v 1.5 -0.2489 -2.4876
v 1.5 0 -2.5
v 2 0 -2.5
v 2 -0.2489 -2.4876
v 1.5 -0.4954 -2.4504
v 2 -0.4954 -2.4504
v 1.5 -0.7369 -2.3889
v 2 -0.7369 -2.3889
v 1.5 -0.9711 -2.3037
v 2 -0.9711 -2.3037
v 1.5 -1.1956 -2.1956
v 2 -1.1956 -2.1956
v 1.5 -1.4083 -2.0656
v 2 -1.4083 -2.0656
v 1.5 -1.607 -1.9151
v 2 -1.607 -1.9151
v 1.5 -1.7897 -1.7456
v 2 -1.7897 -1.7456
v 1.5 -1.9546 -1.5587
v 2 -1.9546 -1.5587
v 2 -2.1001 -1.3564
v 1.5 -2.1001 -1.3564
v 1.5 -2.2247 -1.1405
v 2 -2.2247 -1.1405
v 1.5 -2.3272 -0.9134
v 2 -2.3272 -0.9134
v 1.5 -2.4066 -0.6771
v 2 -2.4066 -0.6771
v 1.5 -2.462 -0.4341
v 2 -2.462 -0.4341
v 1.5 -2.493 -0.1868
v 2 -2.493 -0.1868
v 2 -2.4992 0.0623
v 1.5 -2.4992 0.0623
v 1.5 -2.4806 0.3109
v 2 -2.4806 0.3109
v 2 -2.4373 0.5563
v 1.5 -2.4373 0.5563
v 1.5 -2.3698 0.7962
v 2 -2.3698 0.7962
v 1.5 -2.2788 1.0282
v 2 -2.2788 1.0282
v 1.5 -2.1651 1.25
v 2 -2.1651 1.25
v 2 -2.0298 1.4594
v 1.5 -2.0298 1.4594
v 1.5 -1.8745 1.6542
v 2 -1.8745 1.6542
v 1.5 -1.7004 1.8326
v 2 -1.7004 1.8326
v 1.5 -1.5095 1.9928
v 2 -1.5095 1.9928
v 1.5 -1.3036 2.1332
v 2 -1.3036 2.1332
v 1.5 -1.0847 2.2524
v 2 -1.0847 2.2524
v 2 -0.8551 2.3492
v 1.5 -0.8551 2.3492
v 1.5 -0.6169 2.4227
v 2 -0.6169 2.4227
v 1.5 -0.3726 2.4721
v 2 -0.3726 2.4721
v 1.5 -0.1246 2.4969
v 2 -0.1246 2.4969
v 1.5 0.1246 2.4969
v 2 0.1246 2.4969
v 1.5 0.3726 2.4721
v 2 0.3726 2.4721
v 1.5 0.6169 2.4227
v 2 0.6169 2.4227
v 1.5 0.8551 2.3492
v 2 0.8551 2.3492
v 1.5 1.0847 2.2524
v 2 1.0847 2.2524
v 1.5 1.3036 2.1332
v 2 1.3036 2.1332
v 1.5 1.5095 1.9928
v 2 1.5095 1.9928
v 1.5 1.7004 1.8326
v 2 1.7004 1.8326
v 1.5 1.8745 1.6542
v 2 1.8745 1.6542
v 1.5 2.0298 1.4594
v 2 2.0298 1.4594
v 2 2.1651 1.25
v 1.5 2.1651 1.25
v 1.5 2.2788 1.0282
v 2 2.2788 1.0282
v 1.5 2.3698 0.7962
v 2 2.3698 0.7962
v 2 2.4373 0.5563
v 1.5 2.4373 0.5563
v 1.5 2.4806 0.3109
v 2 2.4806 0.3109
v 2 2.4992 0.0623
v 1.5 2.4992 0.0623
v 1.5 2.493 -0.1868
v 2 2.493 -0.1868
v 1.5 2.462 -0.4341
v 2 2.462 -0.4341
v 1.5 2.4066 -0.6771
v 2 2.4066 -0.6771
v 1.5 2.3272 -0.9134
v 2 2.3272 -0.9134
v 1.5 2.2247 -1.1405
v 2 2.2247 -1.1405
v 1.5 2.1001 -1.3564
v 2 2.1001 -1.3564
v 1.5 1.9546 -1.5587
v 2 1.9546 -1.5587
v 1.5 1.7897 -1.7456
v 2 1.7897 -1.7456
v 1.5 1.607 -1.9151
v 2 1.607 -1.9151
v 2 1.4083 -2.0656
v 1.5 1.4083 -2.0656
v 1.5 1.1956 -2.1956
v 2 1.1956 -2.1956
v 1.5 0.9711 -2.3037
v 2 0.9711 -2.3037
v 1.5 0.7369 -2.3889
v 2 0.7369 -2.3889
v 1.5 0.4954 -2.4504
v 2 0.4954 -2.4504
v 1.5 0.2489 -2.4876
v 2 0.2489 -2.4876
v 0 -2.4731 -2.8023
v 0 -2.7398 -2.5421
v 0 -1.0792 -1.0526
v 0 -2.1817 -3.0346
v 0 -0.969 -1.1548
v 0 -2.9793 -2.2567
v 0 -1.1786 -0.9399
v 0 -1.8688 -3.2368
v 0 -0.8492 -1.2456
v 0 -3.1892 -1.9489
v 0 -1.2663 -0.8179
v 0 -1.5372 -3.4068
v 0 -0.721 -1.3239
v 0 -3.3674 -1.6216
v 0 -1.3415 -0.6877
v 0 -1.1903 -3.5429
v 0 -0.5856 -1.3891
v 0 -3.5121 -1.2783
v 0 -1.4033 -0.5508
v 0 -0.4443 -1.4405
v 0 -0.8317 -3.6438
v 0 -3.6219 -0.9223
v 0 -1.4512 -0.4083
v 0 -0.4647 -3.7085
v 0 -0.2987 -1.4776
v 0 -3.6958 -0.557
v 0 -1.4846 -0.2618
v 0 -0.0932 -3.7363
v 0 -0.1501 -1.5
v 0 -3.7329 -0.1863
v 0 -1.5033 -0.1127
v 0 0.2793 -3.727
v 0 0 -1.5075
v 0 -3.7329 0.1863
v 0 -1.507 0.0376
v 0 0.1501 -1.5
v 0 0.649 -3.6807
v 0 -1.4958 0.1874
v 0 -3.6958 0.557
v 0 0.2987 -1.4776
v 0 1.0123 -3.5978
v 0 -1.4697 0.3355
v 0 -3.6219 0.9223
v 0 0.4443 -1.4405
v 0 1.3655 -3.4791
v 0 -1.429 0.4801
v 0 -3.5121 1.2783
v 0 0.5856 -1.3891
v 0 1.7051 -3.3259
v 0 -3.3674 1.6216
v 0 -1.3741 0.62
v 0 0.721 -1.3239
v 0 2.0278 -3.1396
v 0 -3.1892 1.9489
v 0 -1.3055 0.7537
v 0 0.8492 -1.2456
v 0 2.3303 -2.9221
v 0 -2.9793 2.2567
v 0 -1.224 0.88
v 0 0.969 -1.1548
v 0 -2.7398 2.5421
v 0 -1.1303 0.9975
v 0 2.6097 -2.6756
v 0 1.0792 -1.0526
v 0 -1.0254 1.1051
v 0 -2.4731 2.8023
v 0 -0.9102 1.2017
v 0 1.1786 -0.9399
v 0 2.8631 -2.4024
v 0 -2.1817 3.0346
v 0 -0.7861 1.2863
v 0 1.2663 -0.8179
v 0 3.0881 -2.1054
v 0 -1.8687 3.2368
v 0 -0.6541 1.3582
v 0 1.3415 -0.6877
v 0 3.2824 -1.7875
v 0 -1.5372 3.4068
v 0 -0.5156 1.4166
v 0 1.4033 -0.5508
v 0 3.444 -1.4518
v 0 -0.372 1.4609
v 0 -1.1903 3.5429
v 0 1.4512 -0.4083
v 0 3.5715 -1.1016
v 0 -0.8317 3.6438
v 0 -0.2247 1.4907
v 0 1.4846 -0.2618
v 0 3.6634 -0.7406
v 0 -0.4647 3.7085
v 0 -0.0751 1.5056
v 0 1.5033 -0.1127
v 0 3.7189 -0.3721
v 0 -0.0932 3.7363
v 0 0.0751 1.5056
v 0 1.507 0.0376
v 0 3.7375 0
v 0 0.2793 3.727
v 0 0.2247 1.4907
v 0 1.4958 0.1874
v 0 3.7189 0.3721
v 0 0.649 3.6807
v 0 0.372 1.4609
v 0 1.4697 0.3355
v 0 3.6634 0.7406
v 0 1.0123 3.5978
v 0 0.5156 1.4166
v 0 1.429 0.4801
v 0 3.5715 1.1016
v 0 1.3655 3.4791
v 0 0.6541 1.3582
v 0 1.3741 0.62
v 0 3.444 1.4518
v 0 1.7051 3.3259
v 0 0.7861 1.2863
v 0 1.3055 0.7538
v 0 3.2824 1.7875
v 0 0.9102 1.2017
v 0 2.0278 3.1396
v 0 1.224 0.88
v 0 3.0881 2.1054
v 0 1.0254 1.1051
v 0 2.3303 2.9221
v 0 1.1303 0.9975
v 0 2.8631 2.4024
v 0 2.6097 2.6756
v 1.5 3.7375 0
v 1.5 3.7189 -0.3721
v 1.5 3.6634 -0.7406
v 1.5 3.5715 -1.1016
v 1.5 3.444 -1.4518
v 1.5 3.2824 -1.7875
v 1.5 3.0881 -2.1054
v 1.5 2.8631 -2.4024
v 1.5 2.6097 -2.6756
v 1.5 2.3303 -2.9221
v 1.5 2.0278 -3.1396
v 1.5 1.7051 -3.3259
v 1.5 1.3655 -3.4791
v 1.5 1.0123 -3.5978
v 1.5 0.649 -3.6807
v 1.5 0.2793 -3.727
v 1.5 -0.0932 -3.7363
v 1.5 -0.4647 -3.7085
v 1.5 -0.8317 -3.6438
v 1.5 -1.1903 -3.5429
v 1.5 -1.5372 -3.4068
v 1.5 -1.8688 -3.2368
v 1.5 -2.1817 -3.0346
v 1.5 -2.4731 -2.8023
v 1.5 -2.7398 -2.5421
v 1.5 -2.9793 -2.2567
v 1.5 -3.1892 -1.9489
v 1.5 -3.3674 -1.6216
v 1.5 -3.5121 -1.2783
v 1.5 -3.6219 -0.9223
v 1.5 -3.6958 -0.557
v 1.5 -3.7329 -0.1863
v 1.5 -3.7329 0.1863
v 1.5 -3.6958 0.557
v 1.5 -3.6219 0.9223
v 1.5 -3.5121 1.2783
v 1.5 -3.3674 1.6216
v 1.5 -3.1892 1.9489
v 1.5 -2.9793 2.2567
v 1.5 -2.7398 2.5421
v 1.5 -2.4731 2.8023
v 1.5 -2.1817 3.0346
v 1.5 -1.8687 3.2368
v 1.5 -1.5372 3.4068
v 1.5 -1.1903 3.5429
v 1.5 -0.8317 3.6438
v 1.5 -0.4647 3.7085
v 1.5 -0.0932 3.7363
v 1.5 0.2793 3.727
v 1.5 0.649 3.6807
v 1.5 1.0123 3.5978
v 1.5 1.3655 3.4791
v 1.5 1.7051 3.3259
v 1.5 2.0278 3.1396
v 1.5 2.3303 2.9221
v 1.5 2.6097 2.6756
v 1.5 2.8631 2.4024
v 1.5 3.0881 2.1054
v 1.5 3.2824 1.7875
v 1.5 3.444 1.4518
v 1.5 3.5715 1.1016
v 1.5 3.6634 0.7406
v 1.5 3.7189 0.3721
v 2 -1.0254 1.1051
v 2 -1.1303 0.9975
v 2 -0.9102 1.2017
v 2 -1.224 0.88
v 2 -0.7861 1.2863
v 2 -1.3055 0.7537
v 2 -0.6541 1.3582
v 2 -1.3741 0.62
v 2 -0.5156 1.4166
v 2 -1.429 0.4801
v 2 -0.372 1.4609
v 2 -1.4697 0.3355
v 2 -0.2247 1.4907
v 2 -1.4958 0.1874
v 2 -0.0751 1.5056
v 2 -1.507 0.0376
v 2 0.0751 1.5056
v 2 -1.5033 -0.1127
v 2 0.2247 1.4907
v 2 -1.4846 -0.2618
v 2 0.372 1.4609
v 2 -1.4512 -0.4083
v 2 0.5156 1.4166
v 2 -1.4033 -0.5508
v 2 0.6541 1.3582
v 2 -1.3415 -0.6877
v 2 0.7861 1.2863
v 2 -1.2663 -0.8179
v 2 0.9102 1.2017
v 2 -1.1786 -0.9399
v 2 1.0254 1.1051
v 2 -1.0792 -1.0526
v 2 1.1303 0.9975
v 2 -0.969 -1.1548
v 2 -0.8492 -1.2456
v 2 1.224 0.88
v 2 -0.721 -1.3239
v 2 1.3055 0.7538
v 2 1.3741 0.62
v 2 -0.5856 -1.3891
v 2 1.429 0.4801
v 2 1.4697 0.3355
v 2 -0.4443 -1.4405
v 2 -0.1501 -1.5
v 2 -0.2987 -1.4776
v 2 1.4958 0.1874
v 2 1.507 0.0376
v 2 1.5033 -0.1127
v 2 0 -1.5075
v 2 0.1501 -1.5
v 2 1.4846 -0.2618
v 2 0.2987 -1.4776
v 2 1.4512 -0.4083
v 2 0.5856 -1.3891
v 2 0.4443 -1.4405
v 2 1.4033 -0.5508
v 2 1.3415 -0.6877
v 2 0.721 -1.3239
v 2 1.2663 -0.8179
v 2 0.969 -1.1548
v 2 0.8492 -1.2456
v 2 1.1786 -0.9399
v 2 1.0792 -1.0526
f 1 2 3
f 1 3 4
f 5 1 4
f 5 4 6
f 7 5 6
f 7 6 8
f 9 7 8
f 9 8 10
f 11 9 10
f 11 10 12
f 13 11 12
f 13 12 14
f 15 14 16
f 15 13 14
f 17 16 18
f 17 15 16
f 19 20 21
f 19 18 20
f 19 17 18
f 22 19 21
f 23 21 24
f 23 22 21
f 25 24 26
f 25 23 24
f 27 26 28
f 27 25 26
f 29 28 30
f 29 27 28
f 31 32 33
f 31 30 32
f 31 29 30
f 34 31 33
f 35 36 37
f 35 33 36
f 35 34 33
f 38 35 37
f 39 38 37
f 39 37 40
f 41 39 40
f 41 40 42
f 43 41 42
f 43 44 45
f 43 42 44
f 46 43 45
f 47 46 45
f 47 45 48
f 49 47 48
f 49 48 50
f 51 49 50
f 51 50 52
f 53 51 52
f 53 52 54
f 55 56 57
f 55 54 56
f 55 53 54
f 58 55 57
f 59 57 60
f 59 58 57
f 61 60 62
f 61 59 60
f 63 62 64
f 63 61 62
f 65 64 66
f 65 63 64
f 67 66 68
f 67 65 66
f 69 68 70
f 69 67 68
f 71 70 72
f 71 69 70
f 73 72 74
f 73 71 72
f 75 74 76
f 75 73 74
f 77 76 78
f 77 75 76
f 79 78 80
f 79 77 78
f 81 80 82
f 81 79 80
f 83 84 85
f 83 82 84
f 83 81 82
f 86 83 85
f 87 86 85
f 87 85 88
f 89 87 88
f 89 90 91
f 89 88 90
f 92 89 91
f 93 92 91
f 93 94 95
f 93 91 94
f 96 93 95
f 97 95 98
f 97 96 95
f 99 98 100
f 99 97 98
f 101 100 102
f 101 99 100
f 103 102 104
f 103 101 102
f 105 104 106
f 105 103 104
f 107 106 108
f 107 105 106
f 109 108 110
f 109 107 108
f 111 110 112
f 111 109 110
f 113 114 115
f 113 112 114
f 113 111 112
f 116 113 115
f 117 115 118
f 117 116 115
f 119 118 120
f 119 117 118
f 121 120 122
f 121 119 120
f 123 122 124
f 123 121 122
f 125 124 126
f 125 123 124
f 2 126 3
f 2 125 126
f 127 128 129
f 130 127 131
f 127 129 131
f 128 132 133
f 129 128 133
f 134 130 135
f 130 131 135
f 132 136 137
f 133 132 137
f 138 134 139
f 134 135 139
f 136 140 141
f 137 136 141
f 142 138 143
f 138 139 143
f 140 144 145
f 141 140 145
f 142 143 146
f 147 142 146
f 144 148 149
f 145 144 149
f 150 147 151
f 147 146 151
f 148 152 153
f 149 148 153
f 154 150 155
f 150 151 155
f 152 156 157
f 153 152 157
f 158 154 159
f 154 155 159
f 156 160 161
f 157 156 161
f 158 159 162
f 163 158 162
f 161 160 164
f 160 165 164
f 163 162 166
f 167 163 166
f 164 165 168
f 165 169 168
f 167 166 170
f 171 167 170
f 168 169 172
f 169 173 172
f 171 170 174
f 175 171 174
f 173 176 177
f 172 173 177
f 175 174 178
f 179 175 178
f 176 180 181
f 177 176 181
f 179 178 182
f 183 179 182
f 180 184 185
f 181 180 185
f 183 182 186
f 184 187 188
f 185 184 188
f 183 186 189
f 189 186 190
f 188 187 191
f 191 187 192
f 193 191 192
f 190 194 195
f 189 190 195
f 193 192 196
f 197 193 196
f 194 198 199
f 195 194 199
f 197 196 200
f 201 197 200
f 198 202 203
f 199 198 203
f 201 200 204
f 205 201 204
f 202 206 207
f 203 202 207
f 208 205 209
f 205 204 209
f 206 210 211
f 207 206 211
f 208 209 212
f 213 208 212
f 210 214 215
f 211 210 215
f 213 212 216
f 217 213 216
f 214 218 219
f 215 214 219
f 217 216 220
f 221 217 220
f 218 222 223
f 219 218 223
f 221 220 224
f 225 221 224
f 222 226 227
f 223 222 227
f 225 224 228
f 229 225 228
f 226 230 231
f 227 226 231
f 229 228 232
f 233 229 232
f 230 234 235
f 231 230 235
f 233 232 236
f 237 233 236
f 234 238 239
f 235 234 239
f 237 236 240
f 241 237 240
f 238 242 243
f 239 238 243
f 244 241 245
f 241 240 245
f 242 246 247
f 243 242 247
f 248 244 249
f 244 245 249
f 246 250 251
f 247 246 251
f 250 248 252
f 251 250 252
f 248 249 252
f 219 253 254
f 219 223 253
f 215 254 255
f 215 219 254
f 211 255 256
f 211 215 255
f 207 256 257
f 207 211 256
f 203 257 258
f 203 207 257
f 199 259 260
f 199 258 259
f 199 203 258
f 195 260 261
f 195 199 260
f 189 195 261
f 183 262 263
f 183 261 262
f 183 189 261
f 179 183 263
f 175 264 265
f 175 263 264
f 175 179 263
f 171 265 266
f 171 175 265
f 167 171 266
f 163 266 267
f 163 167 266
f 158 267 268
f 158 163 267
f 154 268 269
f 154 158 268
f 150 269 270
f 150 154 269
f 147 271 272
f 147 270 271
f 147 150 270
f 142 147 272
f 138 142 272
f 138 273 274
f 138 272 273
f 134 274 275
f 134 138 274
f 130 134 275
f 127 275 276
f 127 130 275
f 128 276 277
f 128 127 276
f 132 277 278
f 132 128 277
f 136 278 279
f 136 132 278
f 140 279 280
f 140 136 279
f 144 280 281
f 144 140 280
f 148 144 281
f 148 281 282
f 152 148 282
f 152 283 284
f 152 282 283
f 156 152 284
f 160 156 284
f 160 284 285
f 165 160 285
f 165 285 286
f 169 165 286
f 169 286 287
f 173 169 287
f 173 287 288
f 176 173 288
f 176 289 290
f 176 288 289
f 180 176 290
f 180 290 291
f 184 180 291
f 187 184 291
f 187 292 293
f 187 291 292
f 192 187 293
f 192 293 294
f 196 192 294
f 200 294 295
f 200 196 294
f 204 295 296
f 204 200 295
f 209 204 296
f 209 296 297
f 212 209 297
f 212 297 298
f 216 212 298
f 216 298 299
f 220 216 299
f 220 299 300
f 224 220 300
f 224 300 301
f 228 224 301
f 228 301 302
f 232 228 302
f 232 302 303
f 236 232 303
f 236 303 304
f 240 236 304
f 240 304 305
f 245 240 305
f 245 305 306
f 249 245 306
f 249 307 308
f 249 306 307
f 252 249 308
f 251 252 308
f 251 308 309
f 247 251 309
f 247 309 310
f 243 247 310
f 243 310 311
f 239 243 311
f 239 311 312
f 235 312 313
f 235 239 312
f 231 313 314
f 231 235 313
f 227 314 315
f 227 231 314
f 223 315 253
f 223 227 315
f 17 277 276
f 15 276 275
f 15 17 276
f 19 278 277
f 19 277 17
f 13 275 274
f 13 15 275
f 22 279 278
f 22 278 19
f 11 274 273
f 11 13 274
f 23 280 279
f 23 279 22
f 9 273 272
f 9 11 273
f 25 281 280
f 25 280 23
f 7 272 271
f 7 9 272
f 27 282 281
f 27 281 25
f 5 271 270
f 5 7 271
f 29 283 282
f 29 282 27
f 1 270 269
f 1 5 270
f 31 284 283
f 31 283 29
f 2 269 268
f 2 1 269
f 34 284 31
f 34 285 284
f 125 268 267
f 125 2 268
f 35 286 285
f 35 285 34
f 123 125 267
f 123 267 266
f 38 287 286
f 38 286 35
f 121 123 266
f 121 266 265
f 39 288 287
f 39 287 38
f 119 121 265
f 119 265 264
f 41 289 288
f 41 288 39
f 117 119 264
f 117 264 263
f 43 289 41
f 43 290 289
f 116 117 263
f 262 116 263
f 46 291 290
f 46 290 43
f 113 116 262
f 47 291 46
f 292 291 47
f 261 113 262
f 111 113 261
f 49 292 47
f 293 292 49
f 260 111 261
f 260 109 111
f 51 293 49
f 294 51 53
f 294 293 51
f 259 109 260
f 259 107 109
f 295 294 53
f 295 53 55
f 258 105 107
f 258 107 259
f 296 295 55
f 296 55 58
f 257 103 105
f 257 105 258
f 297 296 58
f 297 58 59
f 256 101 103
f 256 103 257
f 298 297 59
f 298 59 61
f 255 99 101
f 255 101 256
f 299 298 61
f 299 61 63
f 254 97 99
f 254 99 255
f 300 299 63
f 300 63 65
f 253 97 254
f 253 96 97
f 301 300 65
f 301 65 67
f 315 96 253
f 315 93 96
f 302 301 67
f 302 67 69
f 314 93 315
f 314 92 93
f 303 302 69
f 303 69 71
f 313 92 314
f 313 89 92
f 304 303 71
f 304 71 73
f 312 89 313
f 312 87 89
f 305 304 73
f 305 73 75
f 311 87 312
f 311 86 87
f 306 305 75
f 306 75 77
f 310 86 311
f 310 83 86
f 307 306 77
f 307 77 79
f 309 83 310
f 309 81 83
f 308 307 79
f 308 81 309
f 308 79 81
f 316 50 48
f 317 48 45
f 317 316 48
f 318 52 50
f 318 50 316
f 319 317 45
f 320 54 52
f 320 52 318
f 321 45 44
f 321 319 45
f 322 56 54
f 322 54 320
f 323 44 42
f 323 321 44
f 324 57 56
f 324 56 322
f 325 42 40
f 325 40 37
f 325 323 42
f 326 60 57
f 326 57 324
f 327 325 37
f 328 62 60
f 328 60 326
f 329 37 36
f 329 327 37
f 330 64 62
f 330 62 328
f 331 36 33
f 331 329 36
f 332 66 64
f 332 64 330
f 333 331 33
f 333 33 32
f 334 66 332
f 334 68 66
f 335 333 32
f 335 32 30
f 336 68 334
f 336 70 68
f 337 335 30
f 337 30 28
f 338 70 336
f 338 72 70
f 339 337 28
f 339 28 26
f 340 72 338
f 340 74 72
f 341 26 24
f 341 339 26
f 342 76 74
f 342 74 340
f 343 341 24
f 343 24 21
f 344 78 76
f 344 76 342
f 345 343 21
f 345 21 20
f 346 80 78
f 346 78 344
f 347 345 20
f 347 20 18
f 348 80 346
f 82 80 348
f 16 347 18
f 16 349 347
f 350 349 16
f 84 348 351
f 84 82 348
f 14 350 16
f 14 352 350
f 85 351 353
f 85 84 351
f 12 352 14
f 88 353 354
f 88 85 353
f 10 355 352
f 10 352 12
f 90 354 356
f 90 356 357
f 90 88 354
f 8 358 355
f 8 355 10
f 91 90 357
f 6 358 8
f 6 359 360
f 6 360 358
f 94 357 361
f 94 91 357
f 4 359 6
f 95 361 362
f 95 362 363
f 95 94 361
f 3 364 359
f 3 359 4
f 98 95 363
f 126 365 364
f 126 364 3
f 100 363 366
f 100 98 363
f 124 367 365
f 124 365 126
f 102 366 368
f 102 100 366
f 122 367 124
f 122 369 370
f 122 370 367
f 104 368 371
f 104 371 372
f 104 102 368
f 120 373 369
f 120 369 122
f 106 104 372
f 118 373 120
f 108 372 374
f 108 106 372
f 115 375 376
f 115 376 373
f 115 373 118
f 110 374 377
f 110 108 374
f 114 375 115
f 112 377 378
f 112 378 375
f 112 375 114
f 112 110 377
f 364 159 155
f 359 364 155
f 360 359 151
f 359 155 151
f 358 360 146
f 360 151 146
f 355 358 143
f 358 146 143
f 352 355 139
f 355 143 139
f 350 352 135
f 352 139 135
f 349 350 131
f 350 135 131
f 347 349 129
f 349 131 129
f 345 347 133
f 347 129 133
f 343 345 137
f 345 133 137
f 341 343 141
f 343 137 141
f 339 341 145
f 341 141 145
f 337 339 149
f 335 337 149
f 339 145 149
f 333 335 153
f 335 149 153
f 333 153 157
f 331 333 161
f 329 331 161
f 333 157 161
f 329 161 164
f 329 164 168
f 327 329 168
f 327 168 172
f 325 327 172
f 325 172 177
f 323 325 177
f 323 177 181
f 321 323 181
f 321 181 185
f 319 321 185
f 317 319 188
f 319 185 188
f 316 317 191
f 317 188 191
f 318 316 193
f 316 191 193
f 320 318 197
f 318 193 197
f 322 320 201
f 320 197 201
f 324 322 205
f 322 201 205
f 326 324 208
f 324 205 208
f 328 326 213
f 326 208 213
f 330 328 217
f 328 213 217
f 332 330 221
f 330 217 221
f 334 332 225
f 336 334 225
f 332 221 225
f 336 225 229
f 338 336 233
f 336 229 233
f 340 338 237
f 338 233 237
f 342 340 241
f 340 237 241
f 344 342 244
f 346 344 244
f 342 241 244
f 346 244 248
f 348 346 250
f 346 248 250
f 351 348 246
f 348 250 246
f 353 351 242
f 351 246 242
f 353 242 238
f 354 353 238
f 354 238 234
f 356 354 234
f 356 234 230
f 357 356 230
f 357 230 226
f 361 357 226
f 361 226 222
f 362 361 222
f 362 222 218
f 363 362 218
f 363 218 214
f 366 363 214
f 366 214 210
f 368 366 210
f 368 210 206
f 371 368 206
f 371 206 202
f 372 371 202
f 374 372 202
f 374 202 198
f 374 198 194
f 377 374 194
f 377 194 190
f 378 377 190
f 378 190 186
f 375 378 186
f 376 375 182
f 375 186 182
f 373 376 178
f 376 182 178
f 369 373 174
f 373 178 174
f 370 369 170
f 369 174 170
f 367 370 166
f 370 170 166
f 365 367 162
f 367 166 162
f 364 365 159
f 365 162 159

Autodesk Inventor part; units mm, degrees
ref_plane "YZ Plane" through (0, 0, 0) normal (1, 0, 0) x (0, 1, 0)
ref_plane "XZ Plane" through (0, 0, 0) normal (0, 1, 0) x (-1, 0, 0)
ref_plane "XY Plane" through (0, 0, 0) normal (0, 0, 1) x (1, 0, 0)
sketch "Sketch1" plane through (0, 0, 0) normal (1, 0, 0) x (0, 1, 0)
  circle A0 centre (0, 0) radius 3.7375
  dimension "d0" = 7.475
extrude "Extrusion1" add sketch "Sketch1" along normal blind 1.5
sketch "Sketch2" plane through (1.5, 0, 0) normal (1, 0, 0) x (0, 0, -1)
  circle A0 centre (0, 0) radius 2.5
  dimension "d4" = 5
extrude "Extrusion2" add sketch "Sketch2" along normal blind 0.5
sketch "Sketch3" plane through (2, 0, 0) normal (1, 0, 0) x (0, 0, -1)
  circle A0 centre (0, 0) radius 2.5 projected
hole "Hole1" at (2, 0, 0) direction (-1, 0, 0) diameter 3.015 end through all
properties part number "roller"
